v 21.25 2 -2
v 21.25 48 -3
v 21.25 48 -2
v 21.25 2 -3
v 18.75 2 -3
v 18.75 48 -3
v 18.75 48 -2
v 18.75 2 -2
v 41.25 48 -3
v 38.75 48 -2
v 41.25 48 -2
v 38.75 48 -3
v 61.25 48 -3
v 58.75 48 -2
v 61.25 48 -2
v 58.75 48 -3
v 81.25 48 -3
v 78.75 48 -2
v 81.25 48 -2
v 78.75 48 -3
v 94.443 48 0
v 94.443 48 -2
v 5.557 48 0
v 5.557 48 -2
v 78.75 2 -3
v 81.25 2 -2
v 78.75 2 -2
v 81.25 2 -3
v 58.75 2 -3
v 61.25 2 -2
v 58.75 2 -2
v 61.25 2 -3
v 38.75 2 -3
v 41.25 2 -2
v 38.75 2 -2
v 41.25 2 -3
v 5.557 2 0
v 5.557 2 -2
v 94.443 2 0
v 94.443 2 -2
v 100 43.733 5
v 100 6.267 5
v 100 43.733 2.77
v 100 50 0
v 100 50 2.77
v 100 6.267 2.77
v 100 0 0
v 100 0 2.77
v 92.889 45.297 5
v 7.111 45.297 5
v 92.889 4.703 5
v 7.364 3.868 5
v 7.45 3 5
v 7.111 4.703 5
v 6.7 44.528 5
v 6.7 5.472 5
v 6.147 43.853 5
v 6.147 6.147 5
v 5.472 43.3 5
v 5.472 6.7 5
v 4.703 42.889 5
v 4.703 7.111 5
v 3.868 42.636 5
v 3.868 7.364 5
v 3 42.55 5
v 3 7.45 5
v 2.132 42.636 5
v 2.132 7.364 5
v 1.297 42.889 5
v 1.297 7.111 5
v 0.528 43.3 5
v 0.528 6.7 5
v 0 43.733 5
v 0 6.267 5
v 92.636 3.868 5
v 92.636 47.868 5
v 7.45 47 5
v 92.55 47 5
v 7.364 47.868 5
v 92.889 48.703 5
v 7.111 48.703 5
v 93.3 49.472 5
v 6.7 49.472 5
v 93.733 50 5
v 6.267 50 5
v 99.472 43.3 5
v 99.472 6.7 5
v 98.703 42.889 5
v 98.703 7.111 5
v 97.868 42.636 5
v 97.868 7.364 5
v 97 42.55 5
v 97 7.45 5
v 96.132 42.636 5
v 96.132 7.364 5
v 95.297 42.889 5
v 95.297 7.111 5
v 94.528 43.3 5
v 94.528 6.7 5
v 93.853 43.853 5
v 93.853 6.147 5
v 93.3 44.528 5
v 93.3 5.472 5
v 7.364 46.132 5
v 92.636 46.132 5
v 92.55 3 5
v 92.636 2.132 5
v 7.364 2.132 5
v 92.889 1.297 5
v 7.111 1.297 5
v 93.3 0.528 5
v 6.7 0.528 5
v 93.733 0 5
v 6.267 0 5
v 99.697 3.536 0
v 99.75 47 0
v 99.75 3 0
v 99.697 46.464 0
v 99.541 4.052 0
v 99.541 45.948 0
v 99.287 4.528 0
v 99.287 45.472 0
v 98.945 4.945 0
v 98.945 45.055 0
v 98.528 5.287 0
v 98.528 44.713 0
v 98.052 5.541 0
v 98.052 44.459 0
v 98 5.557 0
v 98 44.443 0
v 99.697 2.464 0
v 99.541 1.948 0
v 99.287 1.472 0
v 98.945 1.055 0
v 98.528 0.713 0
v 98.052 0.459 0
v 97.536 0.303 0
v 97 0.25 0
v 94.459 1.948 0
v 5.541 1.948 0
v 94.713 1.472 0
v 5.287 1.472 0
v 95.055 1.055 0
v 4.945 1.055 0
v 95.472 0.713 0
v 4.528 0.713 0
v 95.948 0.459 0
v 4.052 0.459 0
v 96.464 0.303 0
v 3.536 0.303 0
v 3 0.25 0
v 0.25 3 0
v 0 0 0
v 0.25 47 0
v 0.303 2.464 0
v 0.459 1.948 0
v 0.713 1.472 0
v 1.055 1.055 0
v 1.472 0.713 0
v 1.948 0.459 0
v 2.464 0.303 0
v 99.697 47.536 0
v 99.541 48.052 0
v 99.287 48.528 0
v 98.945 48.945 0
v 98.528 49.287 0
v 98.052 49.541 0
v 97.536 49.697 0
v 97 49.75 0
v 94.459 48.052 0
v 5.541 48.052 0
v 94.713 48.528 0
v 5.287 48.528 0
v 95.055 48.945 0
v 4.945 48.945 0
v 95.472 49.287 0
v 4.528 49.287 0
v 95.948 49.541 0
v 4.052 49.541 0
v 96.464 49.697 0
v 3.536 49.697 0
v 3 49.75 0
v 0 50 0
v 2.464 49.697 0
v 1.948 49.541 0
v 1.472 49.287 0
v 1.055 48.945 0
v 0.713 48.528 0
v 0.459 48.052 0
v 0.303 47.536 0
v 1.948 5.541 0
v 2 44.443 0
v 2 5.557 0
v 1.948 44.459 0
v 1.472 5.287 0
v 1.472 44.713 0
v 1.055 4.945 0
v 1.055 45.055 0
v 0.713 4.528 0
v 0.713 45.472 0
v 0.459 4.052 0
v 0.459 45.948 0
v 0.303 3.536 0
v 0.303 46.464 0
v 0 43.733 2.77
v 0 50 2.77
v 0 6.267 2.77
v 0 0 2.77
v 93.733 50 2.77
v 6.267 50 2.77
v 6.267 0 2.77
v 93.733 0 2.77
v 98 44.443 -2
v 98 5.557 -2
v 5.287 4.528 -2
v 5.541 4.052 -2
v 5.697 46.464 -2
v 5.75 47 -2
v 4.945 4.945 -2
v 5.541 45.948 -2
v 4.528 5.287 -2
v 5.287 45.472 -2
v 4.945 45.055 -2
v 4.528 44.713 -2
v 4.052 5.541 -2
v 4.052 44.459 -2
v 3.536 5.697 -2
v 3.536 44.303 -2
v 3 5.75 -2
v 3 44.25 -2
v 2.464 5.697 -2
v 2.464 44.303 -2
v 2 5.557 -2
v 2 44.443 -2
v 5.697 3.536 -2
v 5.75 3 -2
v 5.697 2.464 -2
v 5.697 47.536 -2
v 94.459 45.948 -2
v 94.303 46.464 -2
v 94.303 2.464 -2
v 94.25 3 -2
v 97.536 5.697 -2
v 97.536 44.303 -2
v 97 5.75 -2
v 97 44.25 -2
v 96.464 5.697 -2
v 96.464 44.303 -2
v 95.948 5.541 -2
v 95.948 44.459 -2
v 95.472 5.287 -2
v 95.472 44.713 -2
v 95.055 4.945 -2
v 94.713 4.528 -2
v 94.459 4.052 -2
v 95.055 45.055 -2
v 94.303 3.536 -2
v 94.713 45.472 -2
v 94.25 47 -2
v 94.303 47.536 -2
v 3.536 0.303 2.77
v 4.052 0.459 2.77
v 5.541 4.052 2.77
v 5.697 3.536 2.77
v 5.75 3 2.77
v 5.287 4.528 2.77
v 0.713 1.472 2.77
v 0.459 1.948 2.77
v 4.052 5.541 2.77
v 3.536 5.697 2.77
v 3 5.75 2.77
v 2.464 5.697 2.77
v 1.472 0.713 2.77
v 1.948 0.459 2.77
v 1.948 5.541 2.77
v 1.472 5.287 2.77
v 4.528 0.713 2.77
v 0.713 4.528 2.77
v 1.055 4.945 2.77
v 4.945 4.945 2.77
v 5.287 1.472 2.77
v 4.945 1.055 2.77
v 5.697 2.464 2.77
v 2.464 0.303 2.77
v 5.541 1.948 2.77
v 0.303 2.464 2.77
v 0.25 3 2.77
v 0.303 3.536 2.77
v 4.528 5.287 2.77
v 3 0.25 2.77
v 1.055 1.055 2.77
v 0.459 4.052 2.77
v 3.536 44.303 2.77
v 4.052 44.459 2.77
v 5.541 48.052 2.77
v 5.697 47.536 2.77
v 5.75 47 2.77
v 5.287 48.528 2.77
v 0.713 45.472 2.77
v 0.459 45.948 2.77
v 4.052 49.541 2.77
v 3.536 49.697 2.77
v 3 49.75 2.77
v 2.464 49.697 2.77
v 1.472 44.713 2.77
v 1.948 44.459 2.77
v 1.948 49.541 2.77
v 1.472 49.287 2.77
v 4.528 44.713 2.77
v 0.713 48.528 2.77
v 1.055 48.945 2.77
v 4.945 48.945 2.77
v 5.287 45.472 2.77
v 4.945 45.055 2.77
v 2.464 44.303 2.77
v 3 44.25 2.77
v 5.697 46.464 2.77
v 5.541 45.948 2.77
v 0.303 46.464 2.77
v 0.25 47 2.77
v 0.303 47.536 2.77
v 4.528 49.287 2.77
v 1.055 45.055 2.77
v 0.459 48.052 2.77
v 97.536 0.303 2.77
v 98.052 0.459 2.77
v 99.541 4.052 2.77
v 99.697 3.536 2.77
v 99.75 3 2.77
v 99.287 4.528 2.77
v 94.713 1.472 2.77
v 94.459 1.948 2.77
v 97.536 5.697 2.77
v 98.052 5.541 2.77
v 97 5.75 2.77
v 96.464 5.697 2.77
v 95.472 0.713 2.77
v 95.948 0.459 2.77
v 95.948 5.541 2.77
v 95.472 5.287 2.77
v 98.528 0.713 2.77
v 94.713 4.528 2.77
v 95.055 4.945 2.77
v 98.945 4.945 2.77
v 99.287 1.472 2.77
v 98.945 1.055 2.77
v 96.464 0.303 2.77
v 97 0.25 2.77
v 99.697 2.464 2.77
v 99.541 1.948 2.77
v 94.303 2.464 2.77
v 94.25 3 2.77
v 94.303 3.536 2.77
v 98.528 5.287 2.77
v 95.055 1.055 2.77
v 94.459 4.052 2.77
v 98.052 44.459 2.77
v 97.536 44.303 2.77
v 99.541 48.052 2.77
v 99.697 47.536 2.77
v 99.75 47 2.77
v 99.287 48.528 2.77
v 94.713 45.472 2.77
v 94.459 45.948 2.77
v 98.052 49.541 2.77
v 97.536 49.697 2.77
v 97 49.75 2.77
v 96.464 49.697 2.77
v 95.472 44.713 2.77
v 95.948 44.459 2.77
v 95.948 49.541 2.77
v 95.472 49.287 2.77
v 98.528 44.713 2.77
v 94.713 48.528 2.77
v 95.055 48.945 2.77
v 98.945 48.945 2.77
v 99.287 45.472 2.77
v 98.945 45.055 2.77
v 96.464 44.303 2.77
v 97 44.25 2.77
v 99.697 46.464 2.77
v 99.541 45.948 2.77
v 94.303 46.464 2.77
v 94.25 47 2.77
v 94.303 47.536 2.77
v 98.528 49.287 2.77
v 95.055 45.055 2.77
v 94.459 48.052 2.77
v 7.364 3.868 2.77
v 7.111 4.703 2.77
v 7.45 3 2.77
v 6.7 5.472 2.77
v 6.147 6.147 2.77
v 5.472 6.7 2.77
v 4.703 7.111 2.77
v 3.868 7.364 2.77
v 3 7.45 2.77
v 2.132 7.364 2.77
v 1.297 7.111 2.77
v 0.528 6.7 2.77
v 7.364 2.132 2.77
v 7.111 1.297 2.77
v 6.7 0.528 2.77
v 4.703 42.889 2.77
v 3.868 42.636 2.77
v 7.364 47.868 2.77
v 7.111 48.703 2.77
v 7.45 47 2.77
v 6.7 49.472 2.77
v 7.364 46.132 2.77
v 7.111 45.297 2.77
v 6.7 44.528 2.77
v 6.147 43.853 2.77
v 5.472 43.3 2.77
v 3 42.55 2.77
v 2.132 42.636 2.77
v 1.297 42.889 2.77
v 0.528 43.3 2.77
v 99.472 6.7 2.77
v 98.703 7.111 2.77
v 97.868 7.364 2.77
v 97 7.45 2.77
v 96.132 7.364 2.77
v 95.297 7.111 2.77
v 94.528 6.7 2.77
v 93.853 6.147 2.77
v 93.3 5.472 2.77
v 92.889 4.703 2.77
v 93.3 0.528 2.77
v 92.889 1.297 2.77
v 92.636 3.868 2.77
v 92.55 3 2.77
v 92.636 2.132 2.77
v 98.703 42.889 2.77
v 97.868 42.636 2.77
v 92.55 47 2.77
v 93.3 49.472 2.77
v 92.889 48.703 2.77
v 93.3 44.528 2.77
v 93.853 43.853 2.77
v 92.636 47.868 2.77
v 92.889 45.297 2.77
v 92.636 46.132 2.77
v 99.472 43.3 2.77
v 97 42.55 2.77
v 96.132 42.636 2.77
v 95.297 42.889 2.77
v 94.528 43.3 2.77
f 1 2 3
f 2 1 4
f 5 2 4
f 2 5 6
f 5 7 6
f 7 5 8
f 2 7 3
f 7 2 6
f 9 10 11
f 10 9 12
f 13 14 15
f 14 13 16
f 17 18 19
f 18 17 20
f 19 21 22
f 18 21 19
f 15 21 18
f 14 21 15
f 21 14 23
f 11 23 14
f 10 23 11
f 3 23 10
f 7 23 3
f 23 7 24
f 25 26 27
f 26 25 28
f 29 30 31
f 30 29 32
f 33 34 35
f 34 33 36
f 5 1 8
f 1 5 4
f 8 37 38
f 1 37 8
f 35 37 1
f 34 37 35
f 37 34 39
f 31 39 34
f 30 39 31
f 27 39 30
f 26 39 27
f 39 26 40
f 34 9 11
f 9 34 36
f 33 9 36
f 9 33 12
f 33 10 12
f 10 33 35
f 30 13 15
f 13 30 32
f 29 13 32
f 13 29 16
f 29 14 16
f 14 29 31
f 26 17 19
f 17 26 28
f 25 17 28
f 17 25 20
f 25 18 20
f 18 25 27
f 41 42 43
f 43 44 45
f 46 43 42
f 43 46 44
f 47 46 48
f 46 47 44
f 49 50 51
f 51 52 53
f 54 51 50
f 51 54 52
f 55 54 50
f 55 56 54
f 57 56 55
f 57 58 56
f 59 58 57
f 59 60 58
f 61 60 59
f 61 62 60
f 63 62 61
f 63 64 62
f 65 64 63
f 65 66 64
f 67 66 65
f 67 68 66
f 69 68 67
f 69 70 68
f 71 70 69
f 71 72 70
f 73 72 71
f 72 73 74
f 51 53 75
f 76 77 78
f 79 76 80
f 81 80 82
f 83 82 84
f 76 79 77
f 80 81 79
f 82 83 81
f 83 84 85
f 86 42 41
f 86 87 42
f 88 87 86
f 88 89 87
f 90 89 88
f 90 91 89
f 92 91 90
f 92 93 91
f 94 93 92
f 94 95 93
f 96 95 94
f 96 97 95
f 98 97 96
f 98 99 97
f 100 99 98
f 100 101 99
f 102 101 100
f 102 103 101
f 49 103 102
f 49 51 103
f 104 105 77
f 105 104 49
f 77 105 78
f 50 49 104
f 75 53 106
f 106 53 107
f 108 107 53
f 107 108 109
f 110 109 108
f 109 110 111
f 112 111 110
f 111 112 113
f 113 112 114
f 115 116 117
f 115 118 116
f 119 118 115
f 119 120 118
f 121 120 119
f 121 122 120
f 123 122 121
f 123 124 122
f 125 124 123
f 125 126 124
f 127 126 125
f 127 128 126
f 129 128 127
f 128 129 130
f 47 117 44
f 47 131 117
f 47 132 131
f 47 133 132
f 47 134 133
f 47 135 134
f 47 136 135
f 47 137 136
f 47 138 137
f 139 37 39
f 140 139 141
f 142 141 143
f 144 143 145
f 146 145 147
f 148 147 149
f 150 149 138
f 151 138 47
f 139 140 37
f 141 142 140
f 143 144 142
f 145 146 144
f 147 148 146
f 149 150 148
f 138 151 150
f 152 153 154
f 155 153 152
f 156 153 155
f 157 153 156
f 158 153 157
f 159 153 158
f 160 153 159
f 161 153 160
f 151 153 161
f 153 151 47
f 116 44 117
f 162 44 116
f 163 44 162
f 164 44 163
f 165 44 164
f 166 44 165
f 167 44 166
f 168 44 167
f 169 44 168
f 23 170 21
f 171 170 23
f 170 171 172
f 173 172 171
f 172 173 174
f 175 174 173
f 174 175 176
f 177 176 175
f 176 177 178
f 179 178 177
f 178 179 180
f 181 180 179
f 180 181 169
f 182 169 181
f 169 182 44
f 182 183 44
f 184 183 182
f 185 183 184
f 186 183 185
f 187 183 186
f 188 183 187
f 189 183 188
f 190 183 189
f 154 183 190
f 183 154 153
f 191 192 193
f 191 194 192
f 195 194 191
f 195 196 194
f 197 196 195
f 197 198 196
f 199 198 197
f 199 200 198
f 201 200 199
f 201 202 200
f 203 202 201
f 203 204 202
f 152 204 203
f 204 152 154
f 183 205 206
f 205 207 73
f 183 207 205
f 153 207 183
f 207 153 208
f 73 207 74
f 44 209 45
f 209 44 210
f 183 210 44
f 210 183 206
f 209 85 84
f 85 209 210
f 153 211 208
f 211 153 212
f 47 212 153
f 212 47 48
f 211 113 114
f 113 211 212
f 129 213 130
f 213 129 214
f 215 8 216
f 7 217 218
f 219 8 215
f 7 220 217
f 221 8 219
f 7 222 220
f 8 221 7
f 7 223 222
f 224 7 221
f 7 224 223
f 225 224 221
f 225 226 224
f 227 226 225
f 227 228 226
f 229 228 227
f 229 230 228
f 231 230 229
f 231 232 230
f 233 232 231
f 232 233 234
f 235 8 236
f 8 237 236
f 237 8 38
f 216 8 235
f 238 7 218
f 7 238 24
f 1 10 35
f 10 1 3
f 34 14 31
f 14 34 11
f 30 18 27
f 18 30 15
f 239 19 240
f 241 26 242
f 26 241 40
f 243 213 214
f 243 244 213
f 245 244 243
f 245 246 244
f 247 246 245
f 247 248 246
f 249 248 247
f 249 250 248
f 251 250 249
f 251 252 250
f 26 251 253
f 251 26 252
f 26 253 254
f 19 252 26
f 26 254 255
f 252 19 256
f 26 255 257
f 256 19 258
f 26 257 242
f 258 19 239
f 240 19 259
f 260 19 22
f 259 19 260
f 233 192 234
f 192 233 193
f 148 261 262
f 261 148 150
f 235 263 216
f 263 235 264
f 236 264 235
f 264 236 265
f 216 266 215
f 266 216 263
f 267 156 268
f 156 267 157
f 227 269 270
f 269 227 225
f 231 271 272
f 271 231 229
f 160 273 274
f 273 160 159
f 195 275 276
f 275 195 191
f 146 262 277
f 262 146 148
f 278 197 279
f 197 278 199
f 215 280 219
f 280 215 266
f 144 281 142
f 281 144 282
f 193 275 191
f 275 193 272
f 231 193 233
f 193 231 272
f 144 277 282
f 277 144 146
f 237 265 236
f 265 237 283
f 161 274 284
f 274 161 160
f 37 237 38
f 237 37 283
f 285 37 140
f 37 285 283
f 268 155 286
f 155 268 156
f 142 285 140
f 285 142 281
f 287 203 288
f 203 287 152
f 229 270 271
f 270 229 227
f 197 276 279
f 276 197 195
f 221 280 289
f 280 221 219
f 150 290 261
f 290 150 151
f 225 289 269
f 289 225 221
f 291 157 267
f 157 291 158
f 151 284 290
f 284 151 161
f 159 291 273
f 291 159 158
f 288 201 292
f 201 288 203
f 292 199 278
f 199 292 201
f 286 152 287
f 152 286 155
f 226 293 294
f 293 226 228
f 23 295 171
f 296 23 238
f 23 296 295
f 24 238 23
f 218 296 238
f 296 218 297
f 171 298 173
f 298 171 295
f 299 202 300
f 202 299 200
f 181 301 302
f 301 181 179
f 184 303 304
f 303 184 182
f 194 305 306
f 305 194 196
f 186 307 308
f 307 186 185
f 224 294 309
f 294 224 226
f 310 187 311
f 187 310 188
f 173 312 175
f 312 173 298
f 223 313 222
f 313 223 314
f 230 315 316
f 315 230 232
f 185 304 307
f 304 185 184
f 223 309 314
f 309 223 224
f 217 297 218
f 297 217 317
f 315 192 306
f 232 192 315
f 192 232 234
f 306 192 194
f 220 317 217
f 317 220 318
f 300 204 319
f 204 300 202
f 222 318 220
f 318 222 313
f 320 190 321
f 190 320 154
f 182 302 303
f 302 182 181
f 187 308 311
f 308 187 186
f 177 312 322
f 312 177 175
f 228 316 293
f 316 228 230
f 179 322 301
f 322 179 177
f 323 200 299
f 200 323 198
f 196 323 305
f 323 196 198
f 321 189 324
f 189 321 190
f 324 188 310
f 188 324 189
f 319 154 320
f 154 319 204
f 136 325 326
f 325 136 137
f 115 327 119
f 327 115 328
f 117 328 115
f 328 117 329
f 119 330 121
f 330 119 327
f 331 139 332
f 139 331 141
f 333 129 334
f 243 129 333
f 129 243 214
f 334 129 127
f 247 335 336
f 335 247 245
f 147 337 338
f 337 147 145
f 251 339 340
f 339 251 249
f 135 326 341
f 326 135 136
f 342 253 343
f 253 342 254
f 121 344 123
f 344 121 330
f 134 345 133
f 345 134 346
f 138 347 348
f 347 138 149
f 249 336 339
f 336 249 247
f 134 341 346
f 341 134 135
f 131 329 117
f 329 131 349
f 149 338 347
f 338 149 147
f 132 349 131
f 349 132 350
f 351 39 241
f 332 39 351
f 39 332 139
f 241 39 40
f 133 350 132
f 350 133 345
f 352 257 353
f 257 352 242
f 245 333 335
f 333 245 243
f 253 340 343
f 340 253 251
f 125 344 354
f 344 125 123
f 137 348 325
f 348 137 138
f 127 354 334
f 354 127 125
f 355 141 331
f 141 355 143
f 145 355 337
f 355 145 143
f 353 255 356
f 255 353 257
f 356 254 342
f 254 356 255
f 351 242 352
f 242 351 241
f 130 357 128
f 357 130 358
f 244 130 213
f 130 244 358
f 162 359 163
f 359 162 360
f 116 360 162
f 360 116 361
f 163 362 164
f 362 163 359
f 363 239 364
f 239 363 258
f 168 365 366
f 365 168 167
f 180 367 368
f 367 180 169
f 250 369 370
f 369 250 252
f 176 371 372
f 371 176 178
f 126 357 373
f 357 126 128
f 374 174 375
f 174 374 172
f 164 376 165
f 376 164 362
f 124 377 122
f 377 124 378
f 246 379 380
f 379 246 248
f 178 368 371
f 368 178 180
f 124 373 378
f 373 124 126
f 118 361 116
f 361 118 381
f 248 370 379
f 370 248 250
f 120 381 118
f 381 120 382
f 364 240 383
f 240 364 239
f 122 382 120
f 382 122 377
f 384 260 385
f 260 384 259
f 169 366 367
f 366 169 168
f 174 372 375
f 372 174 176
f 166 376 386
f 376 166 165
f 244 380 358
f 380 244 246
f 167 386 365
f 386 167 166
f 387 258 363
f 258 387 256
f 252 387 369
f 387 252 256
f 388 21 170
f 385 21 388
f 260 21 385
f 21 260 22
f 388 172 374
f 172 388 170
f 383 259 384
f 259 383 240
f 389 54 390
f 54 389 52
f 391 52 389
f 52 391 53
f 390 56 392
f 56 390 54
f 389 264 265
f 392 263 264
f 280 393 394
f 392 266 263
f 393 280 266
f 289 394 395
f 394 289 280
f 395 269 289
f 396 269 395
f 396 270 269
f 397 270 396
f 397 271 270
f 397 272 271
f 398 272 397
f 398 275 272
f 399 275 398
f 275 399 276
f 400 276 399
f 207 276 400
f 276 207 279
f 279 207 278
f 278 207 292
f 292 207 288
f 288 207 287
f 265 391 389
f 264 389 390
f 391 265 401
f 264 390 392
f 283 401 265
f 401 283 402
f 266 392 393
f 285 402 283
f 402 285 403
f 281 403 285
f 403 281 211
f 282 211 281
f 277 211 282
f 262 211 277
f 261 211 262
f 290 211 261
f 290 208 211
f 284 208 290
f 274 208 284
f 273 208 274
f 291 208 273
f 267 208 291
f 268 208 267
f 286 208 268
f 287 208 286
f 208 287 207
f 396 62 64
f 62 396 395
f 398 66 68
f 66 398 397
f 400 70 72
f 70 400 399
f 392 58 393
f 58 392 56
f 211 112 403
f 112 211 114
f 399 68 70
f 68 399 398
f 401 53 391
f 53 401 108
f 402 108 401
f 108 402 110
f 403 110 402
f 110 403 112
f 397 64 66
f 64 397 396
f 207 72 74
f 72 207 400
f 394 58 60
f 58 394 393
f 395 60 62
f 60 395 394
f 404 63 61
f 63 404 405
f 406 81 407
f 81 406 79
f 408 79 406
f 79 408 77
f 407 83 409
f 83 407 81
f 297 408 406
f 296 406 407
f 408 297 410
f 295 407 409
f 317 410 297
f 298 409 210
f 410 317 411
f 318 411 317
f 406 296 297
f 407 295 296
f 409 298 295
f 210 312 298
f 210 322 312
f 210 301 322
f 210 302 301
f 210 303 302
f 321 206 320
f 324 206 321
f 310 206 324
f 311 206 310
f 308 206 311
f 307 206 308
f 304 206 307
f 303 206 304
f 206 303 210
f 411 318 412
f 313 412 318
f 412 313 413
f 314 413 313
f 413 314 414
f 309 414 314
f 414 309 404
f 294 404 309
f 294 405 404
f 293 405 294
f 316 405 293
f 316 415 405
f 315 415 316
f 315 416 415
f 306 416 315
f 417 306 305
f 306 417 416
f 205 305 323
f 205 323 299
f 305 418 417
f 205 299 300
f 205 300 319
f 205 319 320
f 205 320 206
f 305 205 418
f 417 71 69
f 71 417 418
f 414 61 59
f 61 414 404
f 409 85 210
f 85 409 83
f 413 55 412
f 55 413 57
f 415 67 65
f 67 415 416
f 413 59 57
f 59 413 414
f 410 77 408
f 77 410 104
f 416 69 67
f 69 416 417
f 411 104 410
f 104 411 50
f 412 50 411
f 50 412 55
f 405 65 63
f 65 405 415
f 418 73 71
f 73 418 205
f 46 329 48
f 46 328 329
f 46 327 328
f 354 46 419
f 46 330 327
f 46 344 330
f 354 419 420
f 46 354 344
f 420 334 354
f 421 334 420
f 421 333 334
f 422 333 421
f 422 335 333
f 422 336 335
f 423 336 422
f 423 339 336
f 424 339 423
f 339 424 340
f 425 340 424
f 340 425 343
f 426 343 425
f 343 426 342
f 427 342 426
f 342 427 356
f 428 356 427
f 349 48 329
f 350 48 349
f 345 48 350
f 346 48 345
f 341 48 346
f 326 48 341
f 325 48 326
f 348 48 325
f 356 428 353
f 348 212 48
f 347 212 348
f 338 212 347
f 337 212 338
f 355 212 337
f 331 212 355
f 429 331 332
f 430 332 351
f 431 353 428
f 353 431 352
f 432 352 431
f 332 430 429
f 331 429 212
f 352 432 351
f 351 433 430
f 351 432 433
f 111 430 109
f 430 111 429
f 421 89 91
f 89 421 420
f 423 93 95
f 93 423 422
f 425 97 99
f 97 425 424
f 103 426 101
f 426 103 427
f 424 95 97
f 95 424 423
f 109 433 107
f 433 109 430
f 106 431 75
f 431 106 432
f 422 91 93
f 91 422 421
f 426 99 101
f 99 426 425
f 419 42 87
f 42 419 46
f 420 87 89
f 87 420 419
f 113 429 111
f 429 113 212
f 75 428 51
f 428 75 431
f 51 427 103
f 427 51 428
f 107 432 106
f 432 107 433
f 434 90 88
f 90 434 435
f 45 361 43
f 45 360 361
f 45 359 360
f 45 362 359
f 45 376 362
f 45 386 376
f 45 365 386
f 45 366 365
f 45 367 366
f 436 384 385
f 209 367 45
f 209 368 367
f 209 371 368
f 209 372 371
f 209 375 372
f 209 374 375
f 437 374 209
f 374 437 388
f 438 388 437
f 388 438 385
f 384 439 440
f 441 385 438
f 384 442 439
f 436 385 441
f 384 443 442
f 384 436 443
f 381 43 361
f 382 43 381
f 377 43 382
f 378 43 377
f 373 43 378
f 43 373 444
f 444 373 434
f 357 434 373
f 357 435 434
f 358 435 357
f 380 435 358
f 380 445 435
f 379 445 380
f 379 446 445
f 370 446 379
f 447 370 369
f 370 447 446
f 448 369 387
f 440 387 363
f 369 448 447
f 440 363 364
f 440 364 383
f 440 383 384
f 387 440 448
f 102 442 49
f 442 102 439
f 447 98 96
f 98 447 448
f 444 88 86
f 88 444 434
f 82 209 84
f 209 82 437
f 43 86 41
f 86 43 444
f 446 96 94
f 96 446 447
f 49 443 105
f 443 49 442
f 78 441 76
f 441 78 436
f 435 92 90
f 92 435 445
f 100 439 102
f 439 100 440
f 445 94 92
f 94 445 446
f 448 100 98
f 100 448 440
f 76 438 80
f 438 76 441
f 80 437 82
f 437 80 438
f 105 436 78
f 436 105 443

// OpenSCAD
$fn = 32;

// ----------------------------------------------------------------------
// Enclosure lid: 100 x 50 x 5 mm, 4 bolt holes
// ----------------------------------------------------------------------

// --- parameters (mm) ---
length = 100;             // lid length, X
width = 50;               // lid width, Y
plate_t = 5;              // lid plate thickness
bolt_d = 5.5;             // bolt clearance
boss_lip = 3;             // bolt hole inset from the corner
sink = 1;                 // overlap of the lip and ribs into the plate
lip_h = 3;                // lip height below the plate
lip_wall = 2;             // lip wall thickness
cs_d = 8.9;               // countersink diameter
cs_h = 2.23;              // countersink depth
rib_n = 4;                // stiffening ribs
rib_t = 2.5;              // rib thickness
rib_h = 4;                // rib height below the plate

module plate() {
  cube([length, width, plate_t]);
  /* lip that drops into the housing opening, sunk into the plate */
  translate([lip_wall, lip_wall, -lip_h + sink]) cube([length - 2 * lip_wall, width - 2 * lip_wall, lip_h]);
  /* stiffening ribs under the plate */
  for (i = [1 : rib_n]) translate([length * i / (rib_n + 1) - rib_t / 2, lip_wall, -rib_h + sink]) cube([rib_t, width - 2 * lip_wall, rib_h]);
}

difference() {
  plate();
  /* bolt pattern matching the corner bosses */
  for (sx = [0, 1]) for (sy = [0, 1])
    translate([sx * (length - 2 * boss_lip) + boss_lip, sy * (width - 2 * boss_lip) + boss_lip, -lip_h - 1])
      cylinder(h = plate_t + lip_h + 2, d = bolt_d);
  /* countersinks so the heads sit flush */
  for (sx = [0, 1]) for (sy = [0, 1])
    translate([sx * (length - 2 * boss_lip) + boss_lip, sy * (width - 2 * boss_lip) + boss_lip, plate_t - cs_h])
      cylinder(h = cs_h + 0.5, d = cs_d);
}
